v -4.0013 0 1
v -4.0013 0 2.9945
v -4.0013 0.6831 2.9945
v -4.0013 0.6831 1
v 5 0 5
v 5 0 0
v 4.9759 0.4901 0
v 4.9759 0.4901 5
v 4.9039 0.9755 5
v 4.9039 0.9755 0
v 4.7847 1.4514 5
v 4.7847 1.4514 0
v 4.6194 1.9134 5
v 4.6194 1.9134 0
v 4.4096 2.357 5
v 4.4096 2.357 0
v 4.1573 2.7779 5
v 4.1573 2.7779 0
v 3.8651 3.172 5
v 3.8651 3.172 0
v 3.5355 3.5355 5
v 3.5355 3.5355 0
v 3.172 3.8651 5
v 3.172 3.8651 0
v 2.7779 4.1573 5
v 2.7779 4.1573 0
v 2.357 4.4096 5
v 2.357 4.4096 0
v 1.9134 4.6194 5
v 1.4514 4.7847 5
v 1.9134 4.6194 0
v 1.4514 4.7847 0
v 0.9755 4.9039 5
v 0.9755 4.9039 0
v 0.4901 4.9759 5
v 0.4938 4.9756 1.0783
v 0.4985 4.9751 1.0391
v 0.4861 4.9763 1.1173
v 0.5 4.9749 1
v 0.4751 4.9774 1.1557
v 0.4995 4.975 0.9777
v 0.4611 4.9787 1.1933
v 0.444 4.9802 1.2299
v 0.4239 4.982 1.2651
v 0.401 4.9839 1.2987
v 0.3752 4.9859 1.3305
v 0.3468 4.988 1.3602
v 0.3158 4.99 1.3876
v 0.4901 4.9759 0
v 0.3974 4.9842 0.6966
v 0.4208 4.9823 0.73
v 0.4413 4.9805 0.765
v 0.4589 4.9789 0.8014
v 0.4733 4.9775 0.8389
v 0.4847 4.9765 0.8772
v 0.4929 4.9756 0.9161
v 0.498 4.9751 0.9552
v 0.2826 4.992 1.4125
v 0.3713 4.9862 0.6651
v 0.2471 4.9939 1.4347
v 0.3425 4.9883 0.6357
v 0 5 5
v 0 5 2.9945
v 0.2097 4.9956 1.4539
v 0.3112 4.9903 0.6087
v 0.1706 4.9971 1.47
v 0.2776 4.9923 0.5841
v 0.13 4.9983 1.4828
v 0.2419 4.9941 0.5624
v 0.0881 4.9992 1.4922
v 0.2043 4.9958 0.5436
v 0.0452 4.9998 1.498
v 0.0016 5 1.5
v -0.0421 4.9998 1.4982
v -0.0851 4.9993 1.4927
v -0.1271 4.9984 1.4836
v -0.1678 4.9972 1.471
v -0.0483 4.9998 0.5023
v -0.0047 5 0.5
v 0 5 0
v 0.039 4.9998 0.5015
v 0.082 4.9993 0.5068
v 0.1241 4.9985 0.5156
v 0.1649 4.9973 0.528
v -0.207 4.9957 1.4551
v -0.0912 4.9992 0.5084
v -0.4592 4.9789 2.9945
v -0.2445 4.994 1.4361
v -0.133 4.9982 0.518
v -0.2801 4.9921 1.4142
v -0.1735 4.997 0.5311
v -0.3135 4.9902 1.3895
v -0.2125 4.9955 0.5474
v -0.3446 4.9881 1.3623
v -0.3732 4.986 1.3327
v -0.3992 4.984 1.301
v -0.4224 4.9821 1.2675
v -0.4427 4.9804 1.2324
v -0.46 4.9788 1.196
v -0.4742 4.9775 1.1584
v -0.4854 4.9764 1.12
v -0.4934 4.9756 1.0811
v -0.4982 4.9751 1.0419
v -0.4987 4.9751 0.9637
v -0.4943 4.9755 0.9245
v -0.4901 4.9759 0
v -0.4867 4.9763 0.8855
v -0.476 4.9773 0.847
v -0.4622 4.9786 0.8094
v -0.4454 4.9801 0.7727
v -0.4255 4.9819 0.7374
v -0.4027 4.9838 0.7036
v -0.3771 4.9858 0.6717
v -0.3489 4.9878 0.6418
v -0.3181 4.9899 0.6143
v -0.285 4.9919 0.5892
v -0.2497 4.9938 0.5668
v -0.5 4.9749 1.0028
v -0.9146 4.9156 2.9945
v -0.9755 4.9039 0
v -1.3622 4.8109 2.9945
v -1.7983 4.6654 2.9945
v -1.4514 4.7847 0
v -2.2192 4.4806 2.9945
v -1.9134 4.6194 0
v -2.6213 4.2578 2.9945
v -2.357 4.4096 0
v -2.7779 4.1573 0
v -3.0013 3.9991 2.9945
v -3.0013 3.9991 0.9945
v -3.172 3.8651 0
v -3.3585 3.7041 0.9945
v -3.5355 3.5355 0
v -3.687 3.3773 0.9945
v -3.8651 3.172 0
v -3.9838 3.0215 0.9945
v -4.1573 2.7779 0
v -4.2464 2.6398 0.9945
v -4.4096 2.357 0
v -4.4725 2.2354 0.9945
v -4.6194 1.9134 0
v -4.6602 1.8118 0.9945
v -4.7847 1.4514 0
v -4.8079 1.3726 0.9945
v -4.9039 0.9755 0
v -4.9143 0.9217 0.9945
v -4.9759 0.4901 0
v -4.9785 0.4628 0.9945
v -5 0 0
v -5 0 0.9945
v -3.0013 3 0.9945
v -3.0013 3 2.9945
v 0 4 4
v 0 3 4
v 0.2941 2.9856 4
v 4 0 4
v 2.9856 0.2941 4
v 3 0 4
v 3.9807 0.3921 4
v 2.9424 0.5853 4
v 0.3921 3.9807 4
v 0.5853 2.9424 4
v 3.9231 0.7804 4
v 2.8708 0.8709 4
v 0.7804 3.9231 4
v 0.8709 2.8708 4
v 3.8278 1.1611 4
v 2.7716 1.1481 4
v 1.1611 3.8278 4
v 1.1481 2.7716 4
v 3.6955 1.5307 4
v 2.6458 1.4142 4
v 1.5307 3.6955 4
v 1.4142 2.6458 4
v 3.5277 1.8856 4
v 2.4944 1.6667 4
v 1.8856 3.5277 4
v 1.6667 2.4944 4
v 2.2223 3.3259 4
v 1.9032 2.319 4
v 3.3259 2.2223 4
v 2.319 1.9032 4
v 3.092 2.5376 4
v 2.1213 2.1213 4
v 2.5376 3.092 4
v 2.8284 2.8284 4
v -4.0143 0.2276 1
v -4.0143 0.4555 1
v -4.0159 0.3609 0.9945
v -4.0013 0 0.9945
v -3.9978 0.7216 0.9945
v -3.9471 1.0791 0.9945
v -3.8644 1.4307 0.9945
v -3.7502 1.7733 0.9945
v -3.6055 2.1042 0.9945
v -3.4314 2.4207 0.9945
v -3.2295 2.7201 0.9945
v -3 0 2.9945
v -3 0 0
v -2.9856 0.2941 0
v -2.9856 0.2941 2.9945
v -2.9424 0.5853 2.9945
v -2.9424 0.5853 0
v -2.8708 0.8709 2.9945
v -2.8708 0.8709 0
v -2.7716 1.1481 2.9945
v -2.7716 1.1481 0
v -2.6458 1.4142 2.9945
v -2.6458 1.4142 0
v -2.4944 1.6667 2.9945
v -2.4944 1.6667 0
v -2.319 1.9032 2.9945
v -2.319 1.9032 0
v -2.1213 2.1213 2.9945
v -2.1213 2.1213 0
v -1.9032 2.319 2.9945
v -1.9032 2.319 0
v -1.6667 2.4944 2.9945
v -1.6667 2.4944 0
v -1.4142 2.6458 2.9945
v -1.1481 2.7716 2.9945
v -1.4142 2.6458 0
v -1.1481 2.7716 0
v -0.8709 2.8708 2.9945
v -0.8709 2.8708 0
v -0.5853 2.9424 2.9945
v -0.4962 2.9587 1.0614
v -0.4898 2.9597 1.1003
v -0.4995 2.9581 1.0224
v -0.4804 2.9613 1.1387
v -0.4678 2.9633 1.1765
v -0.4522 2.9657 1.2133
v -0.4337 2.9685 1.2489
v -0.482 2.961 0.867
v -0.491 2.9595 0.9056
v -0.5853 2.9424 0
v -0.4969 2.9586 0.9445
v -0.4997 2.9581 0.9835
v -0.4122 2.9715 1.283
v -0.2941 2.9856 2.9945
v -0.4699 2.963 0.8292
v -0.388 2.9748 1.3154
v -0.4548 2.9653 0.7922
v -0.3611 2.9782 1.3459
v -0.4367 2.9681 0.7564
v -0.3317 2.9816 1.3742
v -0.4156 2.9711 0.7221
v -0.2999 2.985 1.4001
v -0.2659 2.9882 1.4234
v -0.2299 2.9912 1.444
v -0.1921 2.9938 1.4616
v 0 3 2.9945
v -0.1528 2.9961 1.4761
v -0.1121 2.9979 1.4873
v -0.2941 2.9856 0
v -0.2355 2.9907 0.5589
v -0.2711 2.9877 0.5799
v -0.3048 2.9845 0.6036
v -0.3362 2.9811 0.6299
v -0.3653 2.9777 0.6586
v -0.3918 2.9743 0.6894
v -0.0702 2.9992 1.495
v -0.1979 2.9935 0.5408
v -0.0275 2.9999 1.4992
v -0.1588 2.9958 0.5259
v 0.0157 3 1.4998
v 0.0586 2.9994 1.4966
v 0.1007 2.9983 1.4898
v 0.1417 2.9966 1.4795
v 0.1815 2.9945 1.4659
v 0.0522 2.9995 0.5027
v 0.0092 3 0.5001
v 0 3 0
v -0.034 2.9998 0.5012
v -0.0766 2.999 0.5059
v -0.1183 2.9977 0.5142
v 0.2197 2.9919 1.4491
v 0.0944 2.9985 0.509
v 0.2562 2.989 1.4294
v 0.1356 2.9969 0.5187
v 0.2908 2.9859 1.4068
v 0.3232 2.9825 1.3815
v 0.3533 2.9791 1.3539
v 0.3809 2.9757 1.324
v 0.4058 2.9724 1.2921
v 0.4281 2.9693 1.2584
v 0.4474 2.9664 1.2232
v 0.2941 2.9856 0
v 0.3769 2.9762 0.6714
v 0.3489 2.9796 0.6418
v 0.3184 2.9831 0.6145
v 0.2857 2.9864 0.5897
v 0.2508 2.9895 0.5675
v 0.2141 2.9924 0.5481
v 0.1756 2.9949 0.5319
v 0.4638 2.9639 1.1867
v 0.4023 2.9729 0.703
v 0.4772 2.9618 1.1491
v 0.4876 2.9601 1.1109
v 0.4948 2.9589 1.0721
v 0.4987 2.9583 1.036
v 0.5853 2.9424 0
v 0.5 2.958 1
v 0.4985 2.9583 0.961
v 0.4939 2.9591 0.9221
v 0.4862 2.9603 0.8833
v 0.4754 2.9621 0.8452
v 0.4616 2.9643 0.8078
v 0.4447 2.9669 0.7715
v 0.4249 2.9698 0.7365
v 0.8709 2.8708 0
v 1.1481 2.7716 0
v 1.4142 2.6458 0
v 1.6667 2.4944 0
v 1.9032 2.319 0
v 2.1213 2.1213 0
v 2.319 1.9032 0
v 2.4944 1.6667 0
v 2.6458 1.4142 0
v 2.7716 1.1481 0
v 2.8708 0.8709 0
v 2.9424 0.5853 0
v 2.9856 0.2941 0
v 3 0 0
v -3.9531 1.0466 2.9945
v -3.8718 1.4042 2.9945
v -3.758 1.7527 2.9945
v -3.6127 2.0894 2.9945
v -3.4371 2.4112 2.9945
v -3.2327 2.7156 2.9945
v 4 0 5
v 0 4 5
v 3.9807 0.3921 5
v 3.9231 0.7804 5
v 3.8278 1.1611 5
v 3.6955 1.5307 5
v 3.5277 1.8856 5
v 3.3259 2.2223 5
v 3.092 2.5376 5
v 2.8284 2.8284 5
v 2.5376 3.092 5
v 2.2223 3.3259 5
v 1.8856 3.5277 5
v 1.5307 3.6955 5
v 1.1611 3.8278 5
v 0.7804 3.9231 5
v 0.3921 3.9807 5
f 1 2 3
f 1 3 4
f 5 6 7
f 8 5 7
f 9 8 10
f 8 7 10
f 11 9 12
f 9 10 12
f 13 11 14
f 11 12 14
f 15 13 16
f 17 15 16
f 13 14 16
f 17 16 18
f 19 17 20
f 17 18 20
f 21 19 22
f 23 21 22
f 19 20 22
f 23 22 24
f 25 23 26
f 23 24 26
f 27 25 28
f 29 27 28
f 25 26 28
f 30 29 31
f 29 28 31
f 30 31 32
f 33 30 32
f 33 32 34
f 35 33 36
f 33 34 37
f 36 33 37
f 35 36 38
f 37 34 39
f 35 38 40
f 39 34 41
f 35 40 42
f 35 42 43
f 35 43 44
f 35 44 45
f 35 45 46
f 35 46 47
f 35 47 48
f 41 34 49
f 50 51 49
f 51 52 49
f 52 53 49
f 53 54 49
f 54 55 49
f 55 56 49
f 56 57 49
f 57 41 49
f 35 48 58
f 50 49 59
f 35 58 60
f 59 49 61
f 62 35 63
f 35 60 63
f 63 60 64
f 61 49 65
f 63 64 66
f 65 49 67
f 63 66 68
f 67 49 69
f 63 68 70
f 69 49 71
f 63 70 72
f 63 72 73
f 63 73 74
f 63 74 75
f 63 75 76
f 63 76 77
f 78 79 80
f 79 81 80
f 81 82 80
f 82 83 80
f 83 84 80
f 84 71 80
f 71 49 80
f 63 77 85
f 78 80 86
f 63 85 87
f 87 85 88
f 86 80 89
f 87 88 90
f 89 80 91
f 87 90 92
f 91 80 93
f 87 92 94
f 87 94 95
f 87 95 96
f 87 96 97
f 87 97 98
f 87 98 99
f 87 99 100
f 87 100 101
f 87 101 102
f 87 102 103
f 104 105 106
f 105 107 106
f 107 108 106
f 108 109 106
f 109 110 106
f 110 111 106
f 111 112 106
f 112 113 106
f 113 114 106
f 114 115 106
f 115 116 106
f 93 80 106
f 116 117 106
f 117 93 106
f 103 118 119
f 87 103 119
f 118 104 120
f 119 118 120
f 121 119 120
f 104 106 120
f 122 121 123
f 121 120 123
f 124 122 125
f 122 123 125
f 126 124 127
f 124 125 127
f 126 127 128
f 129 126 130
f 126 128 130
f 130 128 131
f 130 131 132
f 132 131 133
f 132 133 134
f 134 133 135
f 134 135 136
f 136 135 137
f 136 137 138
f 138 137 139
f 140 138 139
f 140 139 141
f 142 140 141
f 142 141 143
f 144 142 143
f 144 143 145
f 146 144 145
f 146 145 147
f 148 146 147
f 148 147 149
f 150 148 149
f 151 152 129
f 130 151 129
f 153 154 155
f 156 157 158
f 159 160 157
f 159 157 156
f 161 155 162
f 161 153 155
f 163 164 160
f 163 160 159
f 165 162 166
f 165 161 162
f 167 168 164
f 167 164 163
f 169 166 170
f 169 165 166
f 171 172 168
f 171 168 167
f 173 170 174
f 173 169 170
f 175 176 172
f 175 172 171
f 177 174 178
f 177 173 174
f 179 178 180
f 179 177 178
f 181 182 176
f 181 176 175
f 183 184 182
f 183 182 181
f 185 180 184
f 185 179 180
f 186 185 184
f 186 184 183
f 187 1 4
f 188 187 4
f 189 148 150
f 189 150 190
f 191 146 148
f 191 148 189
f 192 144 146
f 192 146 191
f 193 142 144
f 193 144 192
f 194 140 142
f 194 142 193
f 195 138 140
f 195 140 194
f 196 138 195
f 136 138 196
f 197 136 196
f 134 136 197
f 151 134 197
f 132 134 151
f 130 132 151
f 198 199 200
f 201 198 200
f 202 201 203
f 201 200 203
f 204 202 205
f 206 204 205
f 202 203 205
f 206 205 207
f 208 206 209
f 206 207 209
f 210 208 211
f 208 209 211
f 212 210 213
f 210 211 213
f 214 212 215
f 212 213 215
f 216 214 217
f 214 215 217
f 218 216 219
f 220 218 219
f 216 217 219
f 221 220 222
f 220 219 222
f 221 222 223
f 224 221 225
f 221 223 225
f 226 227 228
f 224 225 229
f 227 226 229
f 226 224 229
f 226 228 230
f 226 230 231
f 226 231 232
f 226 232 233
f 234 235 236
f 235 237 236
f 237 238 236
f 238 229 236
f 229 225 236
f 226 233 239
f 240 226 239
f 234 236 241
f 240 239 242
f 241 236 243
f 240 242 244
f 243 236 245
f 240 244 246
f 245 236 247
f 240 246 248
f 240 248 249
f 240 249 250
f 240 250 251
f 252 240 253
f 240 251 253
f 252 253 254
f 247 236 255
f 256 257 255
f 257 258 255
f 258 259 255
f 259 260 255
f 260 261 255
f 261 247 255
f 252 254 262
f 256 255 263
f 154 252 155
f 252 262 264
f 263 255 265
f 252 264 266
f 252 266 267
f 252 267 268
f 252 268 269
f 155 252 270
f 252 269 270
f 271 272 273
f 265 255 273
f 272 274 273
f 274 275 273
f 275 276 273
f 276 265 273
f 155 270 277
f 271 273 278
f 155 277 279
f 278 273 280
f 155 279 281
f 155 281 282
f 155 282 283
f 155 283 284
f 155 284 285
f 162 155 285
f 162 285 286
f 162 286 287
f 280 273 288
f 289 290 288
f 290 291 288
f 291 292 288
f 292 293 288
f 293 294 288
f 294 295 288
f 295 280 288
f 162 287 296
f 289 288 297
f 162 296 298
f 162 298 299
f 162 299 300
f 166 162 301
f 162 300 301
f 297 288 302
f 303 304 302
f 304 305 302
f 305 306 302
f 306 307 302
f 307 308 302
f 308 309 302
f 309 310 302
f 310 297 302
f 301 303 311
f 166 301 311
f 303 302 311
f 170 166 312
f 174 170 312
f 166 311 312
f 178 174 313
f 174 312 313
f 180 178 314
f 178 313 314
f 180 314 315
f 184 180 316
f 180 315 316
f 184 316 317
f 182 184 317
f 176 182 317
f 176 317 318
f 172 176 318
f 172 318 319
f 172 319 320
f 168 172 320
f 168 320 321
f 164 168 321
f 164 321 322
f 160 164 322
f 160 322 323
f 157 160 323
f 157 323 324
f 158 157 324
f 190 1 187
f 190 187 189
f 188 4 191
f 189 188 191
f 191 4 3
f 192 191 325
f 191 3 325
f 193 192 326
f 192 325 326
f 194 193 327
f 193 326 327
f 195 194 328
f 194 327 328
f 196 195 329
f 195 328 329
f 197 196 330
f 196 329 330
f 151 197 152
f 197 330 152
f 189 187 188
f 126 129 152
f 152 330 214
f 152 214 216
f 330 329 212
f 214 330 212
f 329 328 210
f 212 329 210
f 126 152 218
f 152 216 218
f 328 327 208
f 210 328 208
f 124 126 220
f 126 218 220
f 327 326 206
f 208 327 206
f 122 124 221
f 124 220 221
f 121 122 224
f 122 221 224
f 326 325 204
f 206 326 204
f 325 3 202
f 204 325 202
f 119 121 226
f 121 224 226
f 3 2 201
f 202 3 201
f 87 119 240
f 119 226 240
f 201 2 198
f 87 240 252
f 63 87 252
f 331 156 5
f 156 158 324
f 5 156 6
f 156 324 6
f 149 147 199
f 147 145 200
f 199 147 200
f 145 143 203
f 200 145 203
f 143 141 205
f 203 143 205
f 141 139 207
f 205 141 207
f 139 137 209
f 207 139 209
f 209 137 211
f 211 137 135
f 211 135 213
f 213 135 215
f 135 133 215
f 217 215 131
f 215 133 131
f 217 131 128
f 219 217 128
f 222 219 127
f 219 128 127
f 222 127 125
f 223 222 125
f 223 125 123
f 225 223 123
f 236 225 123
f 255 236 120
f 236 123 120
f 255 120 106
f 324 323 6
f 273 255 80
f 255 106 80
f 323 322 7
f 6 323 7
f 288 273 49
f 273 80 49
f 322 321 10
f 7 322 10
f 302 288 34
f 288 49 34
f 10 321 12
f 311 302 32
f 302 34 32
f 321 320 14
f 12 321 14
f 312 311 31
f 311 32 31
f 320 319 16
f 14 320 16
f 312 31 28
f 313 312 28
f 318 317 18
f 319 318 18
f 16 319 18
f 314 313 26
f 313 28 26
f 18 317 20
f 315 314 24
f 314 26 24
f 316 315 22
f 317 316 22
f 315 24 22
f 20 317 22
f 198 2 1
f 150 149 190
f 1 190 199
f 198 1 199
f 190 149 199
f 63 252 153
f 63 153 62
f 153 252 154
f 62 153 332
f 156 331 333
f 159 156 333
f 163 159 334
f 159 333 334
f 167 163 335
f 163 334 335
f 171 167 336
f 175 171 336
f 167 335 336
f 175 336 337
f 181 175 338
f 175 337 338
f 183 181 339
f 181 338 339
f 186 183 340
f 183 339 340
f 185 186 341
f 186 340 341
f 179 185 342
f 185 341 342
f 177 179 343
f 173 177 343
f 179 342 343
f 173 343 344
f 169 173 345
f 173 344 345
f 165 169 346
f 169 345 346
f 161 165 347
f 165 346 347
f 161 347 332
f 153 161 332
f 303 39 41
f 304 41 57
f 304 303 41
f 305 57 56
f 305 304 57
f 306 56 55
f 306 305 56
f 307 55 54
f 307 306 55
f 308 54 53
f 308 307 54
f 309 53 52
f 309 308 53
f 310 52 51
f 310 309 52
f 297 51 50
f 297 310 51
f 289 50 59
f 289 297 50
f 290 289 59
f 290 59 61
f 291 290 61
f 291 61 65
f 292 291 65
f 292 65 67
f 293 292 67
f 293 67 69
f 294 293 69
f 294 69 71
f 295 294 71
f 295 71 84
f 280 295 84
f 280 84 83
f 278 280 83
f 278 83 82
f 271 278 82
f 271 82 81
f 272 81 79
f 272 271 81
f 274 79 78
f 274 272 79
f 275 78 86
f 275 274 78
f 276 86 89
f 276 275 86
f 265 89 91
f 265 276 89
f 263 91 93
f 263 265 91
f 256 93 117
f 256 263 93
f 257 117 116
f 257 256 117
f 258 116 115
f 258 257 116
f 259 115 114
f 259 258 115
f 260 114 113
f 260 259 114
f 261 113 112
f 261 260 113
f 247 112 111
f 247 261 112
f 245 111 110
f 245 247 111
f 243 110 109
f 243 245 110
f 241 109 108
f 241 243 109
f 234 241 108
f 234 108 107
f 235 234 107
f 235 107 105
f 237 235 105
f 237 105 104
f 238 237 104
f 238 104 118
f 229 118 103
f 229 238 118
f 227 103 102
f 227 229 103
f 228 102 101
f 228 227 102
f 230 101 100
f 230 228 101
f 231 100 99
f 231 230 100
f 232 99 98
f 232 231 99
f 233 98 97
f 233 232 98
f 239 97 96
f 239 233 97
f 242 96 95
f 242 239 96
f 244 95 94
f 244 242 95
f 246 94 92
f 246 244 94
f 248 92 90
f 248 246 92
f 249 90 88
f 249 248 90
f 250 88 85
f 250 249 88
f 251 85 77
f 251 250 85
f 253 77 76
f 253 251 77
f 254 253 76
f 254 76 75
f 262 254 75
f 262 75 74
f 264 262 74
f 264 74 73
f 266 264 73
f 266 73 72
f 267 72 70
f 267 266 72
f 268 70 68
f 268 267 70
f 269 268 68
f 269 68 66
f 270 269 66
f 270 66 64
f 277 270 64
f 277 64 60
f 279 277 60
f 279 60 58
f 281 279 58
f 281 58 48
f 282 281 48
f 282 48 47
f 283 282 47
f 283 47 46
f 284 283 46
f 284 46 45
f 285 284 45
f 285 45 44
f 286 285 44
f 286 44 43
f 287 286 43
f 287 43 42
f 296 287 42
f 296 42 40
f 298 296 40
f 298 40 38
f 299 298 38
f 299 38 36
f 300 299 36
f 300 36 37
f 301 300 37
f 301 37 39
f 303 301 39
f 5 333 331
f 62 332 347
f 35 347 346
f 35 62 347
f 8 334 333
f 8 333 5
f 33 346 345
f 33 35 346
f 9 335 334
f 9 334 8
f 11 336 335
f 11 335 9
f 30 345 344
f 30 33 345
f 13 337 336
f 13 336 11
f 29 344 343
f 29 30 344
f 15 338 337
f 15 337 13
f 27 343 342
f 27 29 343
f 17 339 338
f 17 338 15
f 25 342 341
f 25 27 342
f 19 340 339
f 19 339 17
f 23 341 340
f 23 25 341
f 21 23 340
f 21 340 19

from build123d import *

# Parameters (mm, degrees)
BOSS_EXTRUDE1_DEPTH = 5
SKETCH2_R           = 0.5
CUT_EXTRUDE1_DEPTH  = 5
CUT_EXTRUDE2_DEPTH  = 1
CUT_EXTRUDE3_DEPTH  = 2


with BuildPart() as part:
    # Sketch1 → Boss-Extrude1 (new body)
    with BuildSketch(Plane.XY):
        with BuildLine():
            Line((-5, 0), (-3, 0))
            ThreePointArc((-3, 0), (0, 3), (3, 0))
            Line((3, 0), (5, 0))
            ThreePointArc((5, 0), (0, 5), (-5, 0))
        make_face()
    extrude(amount=BOSS_EXTRUDE1_DEPTH)

    # Sketch2 → Cut-Extrude1 (cut)
    with BuildSketch(Plane(origin=(0, 0, 0), x_dir=(1, 0, 0), z_dir=(0, 1, 0))):
        with Locations((0, -1)):
            Circle(SKETCH2_R)
        Polygon((-5, -1), (-4.001262059, -1), (-4.001262059, -1.997514784), (-4.001262059, -2.994544778), (0, -2.994544778), (0, -5), (-5, -5), align=None)
    extrude(amount=CUT_EXTRUDE1_DEPTH, mode=Mode.SUBTRACT)

    # Sketch3 → Cut-Extrude2 (cut)
    with BuildSketch(Plane.XY.offset(5)):
        with BuildLine():
            Line((0, 4), (0, 0))
            Line((0, 0), (4, 0))
            ThreePointArc((4, 0), (2.828427125, 2.828427125), (0, 4))
        make_face()
    extrude(amount=-CUT_EXTRUDE2_DEPTH, mode=Mode.SUBTRACT)

    # Sketch4 → Cut-Extrude3 (cut)
    with BuildSketch(Plane.XY.offset(2.994544778)):
        with BuildLine():
            Line((-3.001262059, 3), (-3.001262059, 3.999053144))
            ThreePointArc((-3.001262059, 3.999053144), (-4.472488697, 2.235362354), (-5, 0))
            Line((-5, 0), (-4.001262059, 0))
            ThreePointArc((-4.001262059, 0), (-3.811157575, 1.603298505), (-3.001262059, 3))
        make_face()
    extrude(amount=-CUT_EXTRUDE3_DEPTH, mode=Mode.SUBTRACT)


solid = part.part
